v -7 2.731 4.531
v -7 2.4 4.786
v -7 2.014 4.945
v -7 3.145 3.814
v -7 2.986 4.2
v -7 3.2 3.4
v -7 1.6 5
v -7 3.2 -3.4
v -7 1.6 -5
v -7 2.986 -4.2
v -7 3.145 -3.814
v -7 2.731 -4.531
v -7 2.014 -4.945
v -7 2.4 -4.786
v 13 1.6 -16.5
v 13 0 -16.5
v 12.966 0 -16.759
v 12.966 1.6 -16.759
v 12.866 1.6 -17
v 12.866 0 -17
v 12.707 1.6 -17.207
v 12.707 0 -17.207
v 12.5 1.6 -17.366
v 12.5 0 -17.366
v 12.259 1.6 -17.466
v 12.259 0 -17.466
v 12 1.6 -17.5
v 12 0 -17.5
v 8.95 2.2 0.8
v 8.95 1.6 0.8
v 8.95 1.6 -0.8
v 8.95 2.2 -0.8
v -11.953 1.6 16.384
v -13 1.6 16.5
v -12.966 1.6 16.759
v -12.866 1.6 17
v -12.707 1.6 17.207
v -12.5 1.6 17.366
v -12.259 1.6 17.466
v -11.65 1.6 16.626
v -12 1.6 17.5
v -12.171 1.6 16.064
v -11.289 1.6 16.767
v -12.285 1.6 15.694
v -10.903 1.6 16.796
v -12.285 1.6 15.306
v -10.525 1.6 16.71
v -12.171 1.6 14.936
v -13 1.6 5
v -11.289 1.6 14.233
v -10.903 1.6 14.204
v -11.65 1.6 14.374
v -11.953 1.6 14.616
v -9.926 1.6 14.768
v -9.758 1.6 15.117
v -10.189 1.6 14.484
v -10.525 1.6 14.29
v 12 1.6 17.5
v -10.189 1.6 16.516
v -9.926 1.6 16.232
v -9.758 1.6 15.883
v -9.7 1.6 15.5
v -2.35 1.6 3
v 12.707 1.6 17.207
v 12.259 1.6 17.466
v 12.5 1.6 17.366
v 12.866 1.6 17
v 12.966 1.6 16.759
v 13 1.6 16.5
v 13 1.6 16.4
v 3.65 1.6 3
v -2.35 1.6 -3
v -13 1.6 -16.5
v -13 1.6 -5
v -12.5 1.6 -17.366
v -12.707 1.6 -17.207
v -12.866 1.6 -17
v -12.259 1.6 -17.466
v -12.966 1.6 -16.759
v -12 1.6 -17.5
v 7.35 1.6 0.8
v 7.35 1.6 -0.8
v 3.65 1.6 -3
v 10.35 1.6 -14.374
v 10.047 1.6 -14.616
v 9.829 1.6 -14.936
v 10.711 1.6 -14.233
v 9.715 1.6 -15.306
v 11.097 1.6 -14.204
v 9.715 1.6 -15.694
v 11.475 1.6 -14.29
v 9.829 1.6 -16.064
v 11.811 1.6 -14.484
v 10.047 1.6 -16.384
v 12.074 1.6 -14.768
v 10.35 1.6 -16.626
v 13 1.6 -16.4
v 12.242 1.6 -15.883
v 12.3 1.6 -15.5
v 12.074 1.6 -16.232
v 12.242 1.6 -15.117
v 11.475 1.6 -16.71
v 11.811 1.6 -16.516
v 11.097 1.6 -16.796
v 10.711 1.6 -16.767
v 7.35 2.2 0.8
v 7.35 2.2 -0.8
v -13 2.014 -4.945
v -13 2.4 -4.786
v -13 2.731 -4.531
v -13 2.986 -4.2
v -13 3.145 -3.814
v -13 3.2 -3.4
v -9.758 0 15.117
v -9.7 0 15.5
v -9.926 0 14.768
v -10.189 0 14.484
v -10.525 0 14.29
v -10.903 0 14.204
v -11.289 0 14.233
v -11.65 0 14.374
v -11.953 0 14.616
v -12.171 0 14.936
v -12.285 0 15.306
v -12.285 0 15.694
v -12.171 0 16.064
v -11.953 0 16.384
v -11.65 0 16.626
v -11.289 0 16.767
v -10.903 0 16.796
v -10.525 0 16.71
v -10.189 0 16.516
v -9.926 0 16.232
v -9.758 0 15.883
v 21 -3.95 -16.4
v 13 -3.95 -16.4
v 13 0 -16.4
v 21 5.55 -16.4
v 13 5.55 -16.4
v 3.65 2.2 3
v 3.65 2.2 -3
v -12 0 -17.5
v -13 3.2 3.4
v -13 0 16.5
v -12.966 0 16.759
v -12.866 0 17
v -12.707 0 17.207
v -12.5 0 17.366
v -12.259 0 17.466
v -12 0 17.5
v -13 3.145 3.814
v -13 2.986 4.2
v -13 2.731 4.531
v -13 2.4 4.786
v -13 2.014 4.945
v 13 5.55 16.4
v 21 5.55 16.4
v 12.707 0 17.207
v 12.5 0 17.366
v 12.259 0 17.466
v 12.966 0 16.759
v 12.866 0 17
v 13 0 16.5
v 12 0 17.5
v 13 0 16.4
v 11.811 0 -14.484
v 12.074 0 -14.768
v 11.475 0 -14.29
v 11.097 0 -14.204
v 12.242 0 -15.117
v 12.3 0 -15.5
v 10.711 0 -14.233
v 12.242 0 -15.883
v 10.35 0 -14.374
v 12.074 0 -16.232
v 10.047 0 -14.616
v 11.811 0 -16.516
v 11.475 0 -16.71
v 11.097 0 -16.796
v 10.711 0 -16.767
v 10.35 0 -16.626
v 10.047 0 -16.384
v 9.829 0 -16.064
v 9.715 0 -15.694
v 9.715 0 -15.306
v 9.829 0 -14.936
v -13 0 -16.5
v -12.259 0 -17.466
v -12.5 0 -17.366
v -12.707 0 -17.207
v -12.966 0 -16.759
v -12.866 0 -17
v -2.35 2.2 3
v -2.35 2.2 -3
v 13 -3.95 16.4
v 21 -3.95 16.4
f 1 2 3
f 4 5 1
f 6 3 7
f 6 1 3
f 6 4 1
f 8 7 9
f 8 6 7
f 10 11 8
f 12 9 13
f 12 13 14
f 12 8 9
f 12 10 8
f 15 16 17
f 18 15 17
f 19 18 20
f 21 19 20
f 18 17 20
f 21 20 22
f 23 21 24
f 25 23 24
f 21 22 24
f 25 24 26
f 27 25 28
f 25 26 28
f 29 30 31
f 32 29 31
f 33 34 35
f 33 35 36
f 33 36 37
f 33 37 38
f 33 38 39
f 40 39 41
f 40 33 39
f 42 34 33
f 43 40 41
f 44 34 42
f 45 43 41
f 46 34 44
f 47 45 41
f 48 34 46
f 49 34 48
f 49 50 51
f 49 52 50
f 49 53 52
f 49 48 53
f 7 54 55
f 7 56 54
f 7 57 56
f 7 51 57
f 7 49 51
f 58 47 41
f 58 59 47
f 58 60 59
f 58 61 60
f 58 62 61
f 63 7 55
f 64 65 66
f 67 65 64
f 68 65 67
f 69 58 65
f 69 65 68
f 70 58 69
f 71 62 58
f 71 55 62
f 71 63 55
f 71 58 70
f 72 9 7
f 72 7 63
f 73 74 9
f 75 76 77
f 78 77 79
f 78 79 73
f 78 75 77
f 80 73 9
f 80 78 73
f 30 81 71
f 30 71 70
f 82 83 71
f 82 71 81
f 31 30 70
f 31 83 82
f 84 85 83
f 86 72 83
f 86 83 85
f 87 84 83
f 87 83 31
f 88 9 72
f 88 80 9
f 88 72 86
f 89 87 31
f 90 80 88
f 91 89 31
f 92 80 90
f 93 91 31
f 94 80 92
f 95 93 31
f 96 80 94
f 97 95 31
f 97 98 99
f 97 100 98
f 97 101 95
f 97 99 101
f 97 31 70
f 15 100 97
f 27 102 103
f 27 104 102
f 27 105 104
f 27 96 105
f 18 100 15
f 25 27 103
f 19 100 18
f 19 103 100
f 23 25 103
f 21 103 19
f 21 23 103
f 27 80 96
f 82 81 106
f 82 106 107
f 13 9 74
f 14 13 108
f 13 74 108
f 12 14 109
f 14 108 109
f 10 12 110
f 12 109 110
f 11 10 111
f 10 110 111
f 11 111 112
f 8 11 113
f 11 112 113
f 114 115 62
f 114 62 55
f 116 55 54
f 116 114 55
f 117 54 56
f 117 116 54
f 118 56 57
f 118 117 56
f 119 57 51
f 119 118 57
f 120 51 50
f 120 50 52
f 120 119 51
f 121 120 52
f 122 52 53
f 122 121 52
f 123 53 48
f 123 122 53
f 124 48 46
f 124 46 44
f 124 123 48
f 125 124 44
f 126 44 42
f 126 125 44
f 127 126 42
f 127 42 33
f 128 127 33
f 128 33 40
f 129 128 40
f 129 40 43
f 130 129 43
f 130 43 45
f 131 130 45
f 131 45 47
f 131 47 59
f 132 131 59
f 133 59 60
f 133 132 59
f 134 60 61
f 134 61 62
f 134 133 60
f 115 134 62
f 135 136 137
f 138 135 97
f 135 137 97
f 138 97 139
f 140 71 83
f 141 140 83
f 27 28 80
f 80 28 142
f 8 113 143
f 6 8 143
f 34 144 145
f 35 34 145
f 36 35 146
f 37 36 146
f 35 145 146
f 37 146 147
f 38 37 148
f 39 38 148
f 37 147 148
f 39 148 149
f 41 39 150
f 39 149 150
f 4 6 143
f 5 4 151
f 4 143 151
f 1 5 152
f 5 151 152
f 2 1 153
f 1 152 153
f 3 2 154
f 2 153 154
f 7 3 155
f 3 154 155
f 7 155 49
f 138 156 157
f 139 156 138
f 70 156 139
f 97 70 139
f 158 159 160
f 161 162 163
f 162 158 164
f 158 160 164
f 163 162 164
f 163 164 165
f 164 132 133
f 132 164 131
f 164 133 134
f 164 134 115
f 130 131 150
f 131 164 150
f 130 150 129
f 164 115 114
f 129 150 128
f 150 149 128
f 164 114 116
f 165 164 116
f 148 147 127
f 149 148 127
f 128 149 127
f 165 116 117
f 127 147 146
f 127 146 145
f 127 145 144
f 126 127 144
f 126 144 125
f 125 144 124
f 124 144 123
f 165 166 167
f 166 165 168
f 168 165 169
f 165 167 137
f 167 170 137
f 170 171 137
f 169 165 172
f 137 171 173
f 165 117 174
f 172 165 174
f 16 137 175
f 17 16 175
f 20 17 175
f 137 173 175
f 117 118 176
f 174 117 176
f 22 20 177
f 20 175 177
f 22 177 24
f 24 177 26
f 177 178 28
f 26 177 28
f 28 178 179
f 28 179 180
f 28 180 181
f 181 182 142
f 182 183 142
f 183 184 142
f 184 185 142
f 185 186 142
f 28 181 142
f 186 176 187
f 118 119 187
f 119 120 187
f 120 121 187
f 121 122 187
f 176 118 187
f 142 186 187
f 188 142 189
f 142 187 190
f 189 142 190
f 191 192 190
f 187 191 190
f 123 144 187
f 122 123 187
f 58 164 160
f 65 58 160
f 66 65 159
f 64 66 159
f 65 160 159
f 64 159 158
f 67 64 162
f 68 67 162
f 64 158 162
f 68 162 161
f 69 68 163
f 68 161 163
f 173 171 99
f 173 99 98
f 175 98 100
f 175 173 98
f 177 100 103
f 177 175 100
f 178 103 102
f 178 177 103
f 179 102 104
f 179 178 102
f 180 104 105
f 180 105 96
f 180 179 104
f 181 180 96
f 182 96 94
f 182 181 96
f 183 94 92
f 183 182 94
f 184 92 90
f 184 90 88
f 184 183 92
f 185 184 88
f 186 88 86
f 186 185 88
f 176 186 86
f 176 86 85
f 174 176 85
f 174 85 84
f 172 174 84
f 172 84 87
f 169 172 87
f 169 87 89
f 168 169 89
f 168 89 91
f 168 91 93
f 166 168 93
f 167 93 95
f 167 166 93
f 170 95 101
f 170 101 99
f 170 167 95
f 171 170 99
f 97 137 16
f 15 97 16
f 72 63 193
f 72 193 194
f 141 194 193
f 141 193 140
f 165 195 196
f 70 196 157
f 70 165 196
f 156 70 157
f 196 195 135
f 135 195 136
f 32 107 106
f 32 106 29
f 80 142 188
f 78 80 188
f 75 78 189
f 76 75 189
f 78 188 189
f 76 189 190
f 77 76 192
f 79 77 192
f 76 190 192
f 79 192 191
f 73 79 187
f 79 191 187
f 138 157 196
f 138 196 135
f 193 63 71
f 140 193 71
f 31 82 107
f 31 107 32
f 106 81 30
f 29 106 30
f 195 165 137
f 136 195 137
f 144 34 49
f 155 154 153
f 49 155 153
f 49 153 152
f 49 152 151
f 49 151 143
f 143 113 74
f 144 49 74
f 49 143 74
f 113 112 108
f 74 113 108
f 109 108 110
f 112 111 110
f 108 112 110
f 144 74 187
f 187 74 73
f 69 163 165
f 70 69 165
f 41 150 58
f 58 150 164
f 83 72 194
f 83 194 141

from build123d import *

# Parameters (mm, degrees)
SKETCH_1_R      = 1.3
EXTRUDE_1_DEPTH = 1.6
EXTRUDE_2_DEPTH = 6
SKETCH_3_W      = 6
SKETCH_3_H      = 6
EXTRUDE_3_DEPTH = 0.6
SKETCH_4_W      = 1.6
SKETCH_4_H      = 1.6
EXTRUDE_4_DEPTH = 0.6
SKETCH_5_W      = 32.8
SKETCH_5_H      = 9.5
EXTRUDE_5_DEPTH = 8


with BuildPart() as part:
    # 草图1 → 凸台-拉伸1 (new body)
    with BuildSketch(Plane(origin=(0, 0, 0), x_dir=(1, 0, 0), z_dir=(0, 1, 0))):
        with BuildLine():
            Line((-12, -17.5), (12, -17.5))
            ThreePointArc((12, -17.5), (12.707106781, -17.207106781), (13, -16.5))
            Line((13, -16.5), (13, 16.5))
            ThreePointArc((13, 16.5), (12.707106781, 17.207106781), (12, 17.5))
            Line((12, 17.5), (-12, 17.5))
            ThreePointArc((-12, 17.5), (-12.707106781, 17.207106781), (-13, 16.5))
            Line((-13, 16.5), (-13, -16.5))
            ThreePointArc((-13, -16.5), (-12.707106781, -17.207106781), (-12, -17.5))
        make_face()
        with Locations((-11, -15.5)):
            Circle(SKETCH_1_R, mode=Mode.SUBTRACT)
        with Locations((11, 15.5)):
            Circle(SKETCH_1_R, mode=Mode.SUBTRACT)
    extrude(amount=EXTRUDE_1_DEPTH)

    # 草图2 → 凸台-拉伸2 (add)
    with BuildSketch(Plane.ZY.offset(13)):
        with BuildLine():
            Line((-3.4, 3.2), (3.4, 3.2))
            ThreePointArc((3.4, 3.2), (5, 1.6), (3.4, 0))
            Line((3.4, 0), (-3.4, 0))
            ThreePointArc((-3.4, 0), (-5, 1.6), (-3.4, 3.2))
        make_face()
    extrude(amount=-EXTRUDE_2_DEPTH)

    # 草图3 → 凸台-拉伸3 (add)
    with BuildSketch(Plane(origin=(0, 1.6, 0), x_dir=(1, 0, 0), z_dir=(0, 1, 0))):
        with Locations((0.65, 0)):
            Rectangle(SKETCH_3_W, SKETCH_3_H)
    extrude(amount=EXTRUDE_3_DEPTH)

    # 草图4 → 凸台-拉伸4 (add)
    with BuildSketch(Plane(origin=(0, 1.6, 0), x_dir=(1, 0, 0), z_dir=(0, 1, 0))):
        with Locations((8.15, 0)):
            Rectangle(SKETCH_4_W, SKETCH_4_H)
    extrude(amount=EXTRUDE_4_DEPTH)

    # 草图5 → 凸台-拉伸5 (add)
    with BuildSketch(Plane(origin=(13, 0, 0), x_dir=(0, 0, -1), z_dir=(1, 0, 0))):
        with Locations((0, 0.8)):
            Rectangle(SKETCH_5_W, SKETCH_5_H)
    extrude(amount=EXTRUDE_5_DEPTH)


solid = part.part
